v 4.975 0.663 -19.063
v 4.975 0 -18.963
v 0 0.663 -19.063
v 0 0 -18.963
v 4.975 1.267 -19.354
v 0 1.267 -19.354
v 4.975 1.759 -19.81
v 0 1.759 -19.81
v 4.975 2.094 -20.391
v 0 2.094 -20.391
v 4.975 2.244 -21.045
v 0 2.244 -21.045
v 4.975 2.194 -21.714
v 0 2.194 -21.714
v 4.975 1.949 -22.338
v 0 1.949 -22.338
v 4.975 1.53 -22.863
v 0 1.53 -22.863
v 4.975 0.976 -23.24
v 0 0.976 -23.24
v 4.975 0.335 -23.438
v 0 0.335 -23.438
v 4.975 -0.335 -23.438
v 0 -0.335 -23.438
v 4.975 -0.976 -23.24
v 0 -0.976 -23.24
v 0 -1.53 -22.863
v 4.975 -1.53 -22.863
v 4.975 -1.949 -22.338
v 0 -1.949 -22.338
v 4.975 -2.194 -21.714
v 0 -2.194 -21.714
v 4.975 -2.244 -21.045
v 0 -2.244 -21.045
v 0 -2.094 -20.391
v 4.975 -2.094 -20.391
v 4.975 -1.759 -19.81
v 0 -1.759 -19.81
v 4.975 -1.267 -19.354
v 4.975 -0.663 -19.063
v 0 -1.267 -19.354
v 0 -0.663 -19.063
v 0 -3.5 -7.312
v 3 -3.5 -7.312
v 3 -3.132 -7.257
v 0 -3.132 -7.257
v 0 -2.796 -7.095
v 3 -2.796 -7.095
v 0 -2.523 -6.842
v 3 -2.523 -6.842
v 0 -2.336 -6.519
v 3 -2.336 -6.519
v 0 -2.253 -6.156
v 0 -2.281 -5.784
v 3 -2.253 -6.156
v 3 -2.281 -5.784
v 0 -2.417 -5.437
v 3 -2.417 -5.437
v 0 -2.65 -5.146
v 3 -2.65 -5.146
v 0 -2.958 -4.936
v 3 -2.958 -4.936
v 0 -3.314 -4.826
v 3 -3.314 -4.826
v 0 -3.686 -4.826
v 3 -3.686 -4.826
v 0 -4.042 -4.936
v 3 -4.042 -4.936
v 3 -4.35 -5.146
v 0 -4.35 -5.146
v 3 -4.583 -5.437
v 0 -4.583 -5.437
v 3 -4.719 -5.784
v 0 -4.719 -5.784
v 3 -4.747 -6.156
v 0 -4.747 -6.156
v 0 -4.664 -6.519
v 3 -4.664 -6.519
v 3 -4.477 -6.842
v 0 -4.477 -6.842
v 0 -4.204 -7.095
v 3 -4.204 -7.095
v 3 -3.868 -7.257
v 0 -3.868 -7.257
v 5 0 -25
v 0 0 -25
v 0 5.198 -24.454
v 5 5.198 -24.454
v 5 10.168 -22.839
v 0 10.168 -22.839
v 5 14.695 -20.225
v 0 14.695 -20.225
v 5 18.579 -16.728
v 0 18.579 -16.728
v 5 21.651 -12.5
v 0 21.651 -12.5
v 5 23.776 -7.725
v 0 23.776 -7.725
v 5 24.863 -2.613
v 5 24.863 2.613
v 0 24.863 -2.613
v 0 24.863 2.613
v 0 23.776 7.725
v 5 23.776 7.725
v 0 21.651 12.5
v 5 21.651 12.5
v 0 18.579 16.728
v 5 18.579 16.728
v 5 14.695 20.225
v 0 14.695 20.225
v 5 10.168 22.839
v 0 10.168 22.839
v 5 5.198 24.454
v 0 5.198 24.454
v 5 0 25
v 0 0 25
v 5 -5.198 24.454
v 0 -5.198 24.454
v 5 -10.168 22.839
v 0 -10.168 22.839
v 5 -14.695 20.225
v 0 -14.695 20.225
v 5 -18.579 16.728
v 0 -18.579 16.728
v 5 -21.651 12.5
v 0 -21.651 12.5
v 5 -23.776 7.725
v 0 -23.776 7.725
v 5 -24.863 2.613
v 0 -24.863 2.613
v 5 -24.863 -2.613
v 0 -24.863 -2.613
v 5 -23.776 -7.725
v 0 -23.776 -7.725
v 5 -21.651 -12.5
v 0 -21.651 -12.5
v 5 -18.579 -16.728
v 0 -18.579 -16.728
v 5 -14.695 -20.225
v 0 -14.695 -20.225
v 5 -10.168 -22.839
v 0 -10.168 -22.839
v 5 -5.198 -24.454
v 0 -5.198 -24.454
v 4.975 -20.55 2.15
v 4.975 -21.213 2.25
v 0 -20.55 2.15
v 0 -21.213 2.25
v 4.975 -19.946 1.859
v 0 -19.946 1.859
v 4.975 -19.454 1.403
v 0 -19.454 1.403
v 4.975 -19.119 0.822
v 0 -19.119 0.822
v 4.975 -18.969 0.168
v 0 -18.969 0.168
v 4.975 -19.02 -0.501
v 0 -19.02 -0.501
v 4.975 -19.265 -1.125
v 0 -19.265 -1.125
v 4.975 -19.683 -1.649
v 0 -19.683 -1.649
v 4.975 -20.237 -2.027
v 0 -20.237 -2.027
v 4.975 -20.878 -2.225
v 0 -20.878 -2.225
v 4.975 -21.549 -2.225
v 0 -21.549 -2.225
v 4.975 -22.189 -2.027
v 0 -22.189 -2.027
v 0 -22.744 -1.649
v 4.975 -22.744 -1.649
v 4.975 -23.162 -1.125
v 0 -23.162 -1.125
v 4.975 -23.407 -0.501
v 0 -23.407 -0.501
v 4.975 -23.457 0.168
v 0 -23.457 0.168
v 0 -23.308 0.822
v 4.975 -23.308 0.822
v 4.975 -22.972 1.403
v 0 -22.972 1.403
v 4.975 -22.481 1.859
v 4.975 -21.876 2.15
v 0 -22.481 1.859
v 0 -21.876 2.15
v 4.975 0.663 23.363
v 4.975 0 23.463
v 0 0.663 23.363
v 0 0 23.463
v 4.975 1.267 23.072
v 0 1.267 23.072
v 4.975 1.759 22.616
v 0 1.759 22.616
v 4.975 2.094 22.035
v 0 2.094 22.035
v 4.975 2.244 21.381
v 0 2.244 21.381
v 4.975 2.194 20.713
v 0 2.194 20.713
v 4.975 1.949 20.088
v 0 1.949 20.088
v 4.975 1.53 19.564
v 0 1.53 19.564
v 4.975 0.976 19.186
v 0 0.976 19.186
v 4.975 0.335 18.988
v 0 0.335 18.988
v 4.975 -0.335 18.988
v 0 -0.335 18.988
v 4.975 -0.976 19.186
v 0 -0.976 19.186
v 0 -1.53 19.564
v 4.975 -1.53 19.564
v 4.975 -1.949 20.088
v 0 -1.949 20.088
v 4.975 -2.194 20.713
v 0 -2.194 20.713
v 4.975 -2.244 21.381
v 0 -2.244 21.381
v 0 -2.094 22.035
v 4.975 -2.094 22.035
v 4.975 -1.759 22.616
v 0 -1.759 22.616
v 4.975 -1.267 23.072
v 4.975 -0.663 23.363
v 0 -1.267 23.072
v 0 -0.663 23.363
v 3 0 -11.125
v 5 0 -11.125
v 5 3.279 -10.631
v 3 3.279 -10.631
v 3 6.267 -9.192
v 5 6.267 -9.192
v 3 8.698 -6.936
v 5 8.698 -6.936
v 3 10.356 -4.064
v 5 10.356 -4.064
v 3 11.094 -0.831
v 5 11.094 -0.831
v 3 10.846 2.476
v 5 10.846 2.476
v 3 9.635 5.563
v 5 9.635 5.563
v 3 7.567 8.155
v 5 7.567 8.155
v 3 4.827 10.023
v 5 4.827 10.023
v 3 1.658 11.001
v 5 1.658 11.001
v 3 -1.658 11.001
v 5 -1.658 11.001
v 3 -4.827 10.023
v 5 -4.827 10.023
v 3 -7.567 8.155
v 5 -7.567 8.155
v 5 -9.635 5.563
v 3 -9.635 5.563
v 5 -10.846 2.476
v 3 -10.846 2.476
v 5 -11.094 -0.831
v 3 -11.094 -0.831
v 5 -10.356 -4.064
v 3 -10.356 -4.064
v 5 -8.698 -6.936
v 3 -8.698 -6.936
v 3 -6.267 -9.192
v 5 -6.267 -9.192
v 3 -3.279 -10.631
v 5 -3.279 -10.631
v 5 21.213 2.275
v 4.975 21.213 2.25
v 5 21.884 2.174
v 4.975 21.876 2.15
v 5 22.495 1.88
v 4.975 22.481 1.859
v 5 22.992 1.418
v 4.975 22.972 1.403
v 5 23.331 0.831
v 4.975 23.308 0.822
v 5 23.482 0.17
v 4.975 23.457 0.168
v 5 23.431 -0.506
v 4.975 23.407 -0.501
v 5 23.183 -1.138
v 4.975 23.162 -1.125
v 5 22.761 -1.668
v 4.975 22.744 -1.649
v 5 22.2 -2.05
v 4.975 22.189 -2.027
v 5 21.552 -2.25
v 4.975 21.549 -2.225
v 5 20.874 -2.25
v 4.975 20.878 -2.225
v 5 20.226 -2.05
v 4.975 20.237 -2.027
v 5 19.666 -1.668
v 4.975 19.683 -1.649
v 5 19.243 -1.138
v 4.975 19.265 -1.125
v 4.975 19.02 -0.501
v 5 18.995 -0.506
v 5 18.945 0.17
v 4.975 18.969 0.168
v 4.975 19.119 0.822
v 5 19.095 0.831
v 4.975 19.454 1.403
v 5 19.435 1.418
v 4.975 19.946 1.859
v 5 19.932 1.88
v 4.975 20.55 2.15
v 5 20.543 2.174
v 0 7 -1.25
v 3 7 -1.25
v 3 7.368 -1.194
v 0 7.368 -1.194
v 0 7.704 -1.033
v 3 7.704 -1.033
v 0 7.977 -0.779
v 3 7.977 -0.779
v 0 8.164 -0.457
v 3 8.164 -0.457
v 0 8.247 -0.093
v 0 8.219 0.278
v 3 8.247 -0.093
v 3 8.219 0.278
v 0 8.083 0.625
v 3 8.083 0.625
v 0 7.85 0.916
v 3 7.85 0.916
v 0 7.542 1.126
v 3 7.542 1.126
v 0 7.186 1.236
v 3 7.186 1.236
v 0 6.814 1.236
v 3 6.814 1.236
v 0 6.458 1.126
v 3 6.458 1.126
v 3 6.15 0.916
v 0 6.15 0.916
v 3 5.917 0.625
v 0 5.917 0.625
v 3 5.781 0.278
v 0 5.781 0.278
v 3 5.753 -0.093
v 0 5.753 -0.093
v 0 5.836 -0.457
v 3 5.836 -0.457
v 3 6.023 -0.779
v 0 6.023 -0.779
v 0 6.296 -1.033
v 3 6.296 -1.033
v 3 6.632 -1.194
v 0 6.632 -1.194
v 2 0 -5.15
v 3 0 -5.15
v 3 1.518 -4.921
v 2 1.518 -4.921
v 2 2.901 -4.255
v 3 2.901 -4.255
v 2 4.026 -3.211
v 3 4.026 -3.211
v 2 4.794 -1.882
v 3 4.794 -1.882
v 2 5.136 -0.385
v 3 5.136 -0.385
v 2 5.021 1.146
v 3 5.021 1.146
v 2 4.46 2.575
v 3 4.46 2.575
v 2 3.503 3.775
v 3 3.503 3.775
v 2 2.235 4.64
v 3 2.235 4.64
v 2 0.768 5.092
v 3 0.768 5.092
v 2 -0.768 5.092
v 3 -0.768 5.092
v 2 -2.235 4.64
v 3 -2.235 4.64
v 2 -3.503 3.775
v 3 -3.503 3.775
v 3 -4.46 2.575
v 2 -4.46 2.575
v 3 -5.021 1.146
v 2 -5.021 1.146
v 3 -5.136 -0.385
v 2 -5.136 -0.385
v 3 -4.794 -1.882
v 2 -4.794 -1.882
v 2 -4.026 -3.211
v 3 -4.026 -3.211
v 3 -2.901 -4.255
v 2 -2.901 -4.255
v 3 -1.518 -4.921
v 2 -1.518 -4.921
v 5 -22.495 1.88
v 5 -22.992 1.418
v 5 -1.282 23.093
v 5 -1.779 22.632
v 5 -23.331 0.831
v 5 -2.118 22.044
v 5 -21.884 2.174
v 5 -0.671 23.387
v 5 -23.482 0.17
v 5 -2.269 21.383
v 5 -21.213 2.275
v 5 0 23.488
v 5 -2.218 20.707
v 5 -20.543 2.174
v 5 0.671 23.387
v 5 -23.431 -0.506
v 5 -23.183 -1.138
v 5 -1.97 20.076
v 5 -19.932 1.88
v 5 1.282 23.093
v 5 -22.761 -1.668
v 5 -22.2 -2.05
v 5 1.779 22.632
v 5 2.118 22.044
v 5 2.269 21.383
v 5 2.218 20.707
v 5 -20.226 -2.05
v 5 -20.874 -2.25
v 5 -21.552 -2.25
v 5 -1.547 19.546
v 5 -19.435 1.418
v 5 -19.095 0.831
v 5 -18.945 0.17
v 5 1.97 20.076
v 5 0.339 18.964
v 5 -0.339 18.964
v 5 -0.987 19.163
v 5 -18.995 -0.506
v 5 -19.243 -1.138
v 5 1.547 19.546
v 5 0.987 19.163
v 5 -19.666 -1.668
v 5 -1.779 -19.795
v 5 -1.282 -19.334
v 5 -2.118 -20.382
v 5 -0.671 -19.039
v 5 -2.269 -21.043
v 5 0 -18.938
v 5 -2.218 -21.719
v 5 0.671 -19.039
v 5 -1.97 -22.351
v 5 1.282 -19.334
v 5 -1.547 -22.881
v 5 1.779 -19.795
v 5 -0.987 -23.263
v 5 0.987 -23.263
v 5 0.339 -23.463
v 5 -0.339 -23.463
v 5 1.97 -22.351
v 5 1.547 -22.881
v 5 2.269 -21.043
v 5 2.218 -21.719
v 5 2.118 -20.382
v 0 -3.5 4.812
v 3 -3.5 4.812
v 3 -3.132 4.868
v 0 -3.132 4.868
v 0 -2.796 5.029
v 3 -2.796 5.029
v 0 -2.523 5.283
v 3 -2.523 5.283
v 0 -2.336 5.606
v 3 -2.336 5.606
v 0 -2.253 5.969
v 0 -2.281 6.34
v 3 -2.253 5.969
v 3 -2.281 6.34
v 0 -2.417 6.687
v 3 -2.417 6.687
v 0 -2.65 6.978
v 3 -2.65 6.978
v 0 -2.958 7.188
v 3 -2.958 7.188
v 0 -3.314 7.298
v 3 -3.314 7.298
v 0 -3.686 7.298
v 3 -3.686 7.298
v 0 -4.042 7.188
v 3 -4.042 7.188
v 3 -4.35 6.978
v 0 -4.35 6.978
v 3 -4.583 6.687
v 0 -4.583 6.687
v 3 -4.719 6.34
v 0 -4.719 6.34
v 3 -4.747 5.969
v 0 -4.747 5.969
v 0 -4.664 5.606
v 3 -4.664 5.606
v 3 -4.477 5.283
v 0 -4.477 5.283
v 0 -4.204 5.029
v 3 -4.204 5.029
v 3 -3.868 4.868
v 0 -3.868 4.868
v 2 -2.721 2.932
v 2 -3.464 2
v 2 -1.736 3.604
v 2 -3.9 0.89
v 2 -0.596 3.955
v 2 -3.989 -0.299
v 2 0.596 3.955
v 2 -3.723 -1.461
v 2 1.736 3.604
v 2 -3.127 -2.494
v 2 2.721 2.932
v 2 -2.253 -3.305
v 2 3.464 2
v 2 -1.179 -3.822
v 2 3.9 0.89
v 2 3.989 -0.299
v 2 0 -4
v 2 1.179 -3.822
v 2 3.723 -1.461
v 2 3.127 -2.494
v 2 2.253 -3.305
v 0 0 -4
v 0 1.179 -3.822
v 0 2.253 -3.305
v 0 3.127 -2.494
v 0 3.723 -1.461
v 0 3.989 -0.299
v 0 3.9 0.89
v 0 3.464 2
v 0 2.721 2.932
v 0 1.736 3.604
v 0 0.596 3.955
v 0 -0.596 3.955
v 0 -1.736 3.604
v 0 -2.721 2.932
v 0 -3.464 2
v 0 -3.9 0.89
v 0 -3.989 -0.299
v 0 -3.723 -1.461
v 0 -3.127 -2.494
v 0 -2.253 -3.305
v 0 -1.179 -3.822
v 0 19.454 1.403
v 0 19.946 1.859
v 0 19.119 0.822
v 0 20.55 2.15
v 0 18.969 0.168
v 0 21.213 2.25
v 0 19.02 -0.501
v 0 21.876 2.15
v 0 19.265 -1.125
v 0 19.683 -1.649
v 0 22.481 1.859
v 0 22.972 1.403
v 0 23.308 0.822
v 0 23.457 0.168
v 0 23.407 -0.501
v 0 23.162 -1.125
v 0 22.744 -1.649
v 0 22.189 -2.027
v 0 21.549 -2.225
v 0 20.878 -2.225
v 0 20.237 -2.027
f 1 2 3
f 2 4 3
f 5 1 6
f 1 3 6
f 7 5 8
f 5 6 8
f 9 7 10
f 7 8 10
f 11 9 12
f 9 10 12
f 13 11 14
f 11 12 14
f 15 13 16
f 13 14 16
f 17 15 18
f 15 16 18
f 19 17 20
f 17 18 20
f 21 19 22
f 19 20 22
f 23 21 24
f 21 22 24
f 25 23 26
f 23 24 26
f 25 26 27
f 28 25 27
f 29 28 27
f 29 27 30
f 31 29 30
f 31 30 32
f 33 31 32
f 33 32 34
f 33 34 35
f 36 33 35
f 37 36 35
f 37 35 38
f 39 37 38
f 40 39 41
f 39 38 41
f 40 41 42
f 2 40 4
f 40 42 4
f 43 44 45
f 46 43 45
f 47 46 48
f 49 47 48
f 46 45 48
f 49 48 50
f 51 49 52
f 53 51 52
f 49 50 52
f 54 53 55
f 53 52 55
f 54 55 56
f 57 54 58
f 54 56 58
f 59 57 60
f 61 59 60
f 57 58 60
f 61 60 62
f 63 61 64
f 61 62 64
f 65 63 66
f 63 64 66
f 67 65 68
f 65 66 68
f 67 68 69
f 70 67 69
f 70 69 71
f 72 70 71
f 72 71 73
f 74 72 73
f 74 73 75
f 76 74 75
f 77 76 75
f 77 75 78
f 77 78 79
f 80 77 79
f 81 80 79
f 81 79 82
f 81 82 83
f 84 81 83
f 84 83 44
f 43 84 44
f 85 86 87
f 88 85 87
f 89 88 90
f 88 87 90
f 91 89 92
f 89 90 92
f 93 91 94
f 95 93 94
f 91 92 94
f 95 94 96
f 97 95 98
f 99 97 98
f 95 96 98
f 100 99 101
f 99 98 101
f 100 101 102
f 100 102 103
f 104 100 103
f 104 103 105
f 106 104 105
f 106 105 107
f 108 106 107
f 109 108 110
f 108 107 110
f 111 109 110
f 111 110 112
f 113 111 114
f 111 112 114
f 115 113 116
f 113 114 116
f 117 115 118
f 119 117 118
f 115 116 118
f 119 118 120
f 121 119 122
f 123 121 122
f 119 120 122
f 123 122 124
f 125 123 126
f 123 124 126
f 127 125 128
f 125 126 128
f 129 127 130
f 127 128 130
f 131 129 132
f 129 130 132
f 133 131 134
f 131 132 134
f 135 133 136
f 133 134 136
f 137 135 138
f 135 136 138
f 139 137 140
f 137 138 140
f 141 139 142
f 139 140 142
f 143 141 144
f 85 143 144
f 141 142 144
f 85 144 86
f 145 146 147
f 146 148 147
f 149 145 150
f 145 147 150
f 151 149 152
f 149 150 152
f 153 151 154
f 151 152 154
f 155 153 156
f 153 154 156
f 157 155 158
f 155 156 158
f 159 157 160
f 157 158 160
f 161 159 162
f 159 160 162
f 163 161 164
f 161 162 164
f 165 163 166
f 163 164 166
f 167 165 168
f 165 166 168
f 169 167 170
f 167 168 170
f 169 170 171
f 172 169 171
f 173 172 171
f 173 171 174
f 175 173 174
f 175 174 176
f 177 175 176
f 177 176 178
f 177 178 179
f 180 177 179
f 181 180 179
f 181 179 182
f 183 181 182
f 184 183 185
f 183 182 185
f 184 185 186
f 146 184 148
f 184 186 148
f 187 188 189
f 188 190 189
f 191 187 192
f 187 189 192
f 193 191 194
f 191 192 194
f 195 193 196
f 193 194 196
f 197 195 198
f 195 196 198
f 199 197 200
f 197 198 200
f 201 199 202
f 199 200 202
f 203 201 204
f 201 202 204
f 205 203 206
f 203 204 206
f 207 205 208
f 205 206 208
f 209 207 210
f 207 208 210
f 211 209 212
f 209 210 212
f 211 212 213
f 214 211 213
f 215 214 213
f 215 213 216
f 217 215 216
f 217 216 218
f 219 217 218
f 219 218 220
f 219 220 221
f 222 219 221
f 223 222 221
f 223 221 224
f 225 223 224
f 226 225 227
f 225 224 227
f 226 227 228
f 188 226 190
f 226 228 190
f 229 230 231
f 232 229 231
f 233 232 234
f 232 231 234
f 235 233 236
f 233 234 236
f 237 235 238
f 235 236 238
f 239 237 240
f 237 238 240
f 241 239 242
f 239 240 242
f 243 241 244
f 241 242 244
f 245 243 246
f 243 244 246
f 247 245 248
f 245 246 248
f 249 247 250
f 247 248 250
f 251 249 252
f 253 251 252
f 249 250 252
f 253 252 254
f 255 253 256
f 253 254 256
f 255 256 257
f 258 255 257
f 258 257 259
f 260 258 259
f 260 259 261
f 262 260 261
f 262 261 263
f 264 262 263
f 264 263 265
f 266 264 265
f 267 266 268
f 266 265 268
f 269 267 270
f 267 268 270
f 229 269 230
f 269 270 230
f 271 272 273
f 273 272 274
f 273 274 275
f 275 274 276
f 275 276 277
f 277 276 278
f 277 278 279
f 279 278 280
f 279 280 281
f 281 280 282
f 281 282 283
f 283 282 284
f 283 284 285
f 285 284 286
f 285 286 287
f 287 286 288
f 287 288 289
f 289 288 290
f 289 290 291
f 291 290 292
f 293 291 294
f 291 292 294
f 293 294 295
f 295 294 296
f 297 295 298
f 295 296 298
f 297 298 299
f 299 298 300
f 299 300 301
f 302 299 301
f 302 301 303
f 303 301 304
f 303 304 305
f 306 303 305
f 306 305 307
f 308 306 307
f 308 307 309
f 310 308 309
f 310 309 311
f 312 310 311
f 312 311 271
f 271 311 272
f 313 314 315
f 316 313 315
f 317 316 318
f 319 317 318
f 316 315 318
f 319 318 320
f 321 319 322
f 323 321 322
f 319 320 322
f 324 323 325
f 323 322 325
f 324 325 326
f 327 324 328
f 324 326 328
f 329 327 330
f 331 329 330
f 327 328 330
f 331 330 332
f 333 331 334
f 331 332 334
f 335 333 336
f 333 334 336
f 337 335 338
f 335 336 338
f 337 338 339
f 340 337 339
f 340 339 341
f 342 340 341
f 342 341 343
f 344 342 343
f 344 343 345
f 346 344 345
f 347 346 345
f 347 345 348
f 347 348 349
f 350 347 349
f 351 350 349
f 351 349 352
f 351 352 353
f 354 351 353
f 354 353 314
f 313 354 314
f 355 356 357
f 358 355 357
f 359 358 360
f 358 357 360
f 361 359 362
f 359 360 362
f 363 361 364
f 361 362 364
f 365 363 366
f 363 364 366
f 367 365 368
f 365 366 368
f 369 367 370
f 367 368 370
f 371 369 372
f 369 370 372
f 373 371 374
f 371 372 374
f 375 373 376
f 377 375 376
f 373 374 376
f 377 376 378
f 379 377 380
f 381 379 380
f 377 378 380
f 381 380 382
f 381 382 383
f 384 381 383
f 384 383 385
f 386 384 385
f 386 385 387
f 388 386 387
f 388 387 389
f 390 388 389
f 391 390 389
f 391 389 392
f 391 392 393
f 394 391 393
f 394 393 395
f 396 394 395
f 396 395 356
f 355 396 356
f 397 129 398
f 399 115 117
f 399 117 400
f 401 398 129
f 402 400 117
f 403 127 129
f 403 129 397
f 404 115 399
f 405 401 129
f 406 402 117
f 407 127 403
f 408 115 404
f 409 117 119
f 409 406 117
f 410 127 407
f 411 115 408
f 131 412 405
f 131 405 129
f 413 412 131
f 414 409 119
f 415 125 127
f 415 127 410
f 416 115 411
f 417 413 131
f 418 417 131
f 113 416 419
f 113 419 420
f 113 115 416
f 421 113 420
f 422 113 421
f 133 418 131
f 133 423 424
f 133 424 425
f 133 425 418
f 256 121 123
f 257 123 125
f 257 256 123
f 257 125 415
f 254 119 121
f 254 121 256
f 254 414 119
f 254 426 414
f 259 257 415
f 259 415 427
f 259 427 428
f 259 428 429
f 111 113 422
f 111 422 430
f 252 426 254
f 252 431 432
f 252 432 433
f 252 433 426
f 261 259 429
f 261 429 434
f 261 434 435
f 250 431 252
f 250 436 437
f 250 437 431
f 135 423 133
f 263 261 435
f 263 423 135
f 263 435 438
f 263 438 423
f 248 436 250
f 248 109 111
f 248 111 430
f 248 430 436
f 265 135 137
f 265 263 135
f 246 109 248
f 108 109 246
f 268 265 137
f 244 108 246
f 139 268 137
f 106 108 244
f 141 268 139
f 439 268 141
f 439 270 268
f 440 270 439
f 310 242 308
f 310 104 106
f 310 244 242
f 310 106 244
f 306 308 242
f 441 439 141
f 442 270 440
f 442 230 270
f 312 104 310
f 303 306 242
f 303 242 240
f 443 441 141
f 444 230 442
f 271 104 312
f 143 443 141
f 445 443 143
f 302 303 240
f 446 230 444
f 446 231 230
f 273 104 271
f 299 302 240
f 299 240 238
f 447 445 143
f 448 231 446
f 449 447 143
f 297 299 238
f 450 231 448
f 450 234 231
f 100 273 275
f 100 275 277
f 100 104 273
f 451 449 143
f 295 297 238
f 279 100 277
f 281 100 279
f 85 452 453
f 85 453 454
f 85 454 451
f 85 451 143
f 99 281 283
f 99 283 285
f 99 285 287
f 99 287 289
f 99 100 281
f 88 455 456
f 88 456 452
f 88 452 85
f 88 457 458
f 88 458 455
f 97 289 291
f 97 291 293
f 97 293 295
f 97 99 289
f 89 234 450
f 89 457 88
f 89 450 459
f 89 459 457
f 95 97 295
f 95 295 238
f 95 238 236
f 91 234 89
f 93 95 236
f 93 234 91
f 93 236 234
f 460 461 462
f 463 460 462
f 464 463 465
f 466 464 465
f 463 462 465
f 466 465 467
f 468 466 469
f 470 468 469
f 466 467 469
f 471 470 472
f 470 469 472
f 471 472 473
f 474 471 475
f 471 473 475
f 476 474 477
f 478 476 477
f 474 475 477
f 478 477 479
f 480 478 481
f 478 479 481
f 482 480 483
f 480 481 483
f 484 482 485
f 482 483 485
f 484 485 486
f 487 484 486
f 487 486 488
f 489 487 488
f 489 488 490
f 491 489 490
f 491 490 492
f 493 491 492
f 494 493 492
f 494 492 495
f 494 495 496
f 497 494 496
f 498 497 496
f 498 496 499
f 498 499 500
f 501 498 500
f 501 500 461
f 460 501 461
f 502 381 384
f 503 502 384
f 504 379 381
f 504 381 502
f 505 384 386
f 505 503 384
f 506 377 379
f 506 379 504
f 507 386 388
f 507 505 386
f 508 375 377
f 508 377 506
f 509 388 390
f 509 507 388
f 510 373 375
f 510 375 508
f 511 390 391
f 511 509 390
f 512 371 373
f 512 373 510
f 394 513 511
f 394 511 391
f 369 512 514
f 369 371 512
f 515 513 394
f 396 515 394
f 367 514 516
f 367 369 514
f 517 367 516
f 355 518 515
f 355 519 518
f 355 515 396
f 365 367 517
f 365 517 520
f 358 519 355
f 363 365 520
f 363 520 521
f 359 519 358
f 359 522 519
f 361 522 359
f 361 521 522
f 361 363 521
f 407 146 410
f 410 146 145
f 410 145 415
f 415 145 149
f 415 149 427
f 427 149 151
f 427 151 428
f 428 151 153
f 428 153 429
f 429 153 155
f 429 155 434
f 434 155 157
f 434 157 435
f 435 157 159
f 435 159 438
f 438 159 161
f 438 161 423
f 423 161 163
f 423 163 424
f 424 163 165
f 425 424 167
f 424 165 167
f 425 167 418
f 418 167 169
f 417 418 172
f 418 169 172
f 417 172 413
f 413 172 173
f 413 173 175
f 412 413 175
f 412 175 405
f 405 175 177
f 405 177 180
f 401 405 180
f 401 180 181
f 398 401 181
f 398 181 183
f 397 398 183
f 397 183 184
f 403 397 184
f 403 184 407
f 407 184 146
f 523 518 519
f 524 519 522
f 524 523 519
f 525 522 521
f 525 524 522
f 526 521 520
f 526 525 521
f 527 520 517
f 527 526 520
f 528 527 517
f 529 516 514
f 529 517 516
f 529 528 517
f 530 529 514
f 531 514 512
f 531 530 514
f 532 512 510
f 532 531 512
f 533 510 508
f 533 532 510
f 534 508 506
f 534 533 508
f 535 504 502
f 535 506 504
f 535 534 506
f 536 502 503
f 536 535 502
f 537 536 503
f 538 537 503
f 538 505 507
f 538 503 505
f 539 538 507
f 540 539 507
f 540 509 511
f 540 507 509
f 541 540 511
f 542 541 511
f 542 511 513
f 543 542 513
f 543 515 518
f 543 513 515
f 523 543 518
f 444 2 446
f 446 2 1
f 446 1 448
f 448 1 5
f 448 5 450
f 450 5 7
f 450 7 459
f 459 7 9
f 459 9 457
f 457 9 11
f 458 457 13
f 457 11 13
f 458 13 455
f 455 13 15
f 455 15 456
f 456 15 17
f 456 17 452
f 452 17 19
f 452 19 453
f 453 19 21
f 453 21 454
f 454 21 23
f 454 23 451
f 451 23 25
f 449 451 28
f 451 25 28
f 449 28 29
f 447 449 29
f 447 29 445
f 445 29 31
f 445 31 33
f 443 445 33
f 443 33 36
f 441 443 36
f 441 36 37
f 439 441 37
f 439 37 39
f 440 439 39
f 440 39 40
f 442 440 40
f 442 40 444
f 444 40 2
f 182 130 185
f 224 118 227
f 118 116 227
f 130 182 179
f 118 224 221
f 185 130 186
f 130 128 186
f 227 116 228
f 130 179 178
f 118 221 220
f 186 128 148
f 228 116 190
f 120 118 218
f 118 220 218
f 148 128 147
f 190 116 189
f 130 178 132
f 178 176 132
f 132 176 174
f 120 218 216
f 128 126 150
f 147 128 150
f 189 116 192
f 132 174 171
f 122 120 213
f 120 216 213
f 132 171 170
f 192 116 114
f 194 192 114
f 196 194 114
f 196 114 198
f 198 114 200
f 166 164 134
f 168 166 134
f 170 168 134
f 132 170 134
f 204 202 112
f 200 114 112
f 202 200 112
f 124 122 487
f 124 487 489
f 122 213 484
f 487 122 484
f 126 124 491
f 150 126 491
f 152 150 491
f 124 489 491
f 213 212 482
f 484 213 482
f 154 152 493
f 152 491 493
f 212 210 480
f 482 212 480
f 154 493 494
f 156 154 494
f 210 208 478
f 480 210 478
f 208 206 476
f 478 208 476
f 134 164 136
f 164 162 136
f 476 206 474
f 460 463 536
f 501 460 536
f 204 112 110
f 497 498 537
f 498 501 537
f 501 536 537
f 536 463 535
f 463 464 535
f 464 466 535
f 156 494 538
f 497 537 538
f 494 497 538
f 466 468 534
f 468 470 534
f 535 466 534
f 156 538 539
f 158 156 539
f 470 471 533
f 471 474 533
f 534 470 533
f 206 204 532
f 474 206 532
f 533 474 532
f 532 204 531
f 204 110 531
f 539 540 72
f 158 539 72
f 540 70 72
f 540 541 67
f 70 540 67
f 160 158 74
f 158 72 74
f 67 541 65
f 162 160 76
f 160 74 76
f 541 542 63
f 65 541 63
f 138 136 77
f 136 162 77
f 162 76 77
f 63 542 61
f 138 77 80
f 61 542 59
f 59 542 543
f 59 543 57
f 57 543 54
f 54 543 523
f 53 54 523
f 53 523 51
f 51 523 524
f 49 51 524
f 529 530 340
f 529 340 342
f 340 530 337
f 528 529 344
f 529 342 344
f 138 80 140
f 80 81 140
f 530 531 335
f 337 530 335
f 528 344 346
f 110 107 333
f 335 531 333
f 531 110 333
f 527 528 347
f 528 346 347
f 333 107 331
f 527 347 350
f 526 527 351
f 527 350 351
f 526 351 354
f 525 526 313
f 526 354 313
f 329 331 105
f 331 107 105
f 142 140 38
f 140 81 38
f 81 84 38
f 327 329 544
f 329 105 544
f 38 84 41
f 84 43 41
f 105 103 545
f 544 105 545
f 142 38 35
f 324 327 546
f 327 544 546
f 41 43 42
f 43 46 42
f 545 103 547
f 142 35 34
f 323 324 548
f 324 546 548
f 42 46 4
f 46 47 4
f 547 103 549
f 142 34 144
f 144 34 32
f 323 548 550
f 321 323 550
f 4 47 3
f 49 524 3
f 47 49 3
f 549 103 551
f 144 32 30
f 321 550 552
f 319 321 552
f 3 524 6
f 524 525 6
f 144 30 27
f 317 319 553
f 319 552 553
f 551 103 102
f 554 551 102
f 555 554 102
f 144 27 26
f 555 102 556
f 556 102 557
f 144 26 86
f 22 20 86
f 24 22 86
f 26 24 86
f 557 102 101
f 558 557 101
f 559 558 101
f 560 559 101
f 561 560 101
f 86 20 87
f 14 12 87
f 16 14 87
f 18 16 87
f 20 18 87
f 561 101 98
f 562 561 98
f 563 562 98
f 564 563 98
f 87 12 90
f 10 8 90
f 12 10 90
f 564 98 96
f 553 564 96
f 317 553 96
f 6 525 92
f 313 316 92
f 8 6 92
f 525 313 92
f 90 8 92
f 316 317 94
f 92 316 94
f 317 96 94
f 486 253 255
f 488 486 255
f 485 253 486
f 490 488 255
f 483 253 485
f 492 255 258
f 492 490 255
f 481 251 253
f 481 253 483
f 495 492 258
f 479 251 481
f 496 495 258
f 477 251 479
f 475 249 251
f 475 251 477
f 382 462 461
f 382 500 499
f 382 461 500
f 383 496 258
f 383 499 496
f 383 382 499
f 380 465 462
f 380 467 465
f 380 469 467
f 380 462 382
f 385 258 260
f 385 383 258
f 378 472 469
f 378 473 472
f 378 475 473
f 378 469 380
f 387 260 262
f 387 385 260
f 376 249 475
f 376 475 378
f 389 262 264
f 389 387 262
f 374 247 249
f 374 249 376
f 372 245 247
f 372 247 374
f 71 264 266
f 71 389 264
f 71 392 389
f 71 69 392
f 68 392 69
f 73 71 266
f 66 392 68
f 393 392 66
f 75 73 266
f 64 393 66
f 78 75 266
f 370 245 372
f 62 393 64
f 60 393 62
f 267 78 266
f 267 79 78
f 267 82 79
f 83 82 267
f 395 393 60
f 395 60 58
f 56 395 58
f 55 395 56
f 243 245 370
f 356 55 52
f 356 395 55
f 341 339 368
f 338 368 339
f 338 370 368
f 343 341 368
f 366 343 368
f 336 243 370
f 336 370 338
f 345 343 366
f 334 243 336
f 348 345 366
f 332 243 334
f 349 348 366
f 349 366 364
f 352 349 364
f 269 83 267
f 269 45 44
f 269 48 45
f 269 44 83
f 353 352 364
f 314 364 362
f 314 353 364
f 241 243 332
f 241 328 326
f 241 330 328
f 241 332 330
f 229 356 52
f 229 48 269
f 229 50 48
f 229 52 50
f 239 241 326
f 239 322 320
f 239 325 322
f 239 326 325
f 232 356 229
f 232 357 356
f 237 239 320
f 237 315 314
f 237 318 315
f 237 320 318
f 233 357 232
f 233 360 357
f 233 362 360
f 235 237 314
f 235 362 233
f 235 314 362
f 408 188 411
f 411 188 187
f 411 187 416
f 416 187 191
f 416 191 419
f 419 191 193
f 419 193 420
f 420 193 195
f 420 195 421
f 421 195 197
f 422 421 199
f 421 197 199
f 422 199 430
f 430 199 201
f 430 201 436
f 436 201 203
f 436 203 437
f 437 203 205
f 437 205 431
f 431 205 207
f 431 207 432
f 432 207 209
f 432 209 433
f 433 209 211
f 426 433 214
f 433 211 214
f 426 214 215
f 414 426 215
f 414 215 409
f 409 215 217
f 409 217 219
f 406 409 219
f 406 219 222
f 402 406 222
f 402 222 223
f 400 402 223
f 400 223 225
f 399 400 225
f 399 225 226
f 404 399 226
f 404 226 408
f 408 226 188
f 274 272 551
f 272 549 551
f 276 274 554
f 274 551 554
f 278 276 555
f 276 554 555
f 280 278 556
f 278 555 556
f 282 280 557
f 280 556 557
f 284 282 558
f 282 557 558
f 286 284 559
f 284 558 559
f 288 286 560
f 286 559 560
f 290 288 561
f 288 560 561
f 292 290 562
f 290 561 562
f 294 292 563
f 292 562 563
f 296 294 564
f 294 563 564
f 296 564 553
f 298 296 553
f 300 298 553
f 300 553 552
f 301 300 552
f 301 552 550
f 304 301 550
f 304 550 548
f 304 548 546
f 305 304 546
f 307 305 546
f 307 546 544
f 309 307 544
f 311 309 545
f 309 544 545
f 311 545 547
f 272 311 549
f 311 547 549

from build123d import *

# Parameters (mm, degrees)
SKETCH1_R                      = 25
SKETCH1_R_2                    = 4
BOSS_EXTRUDE1_DEPTH            = 5
SKETCH2_R                      = 5.15
CUT_EXTRUDE1_DEPTH             = 3
SKETCH3_R                      = 11.125
CUT_EXTRUDE2_DEPTH             = 2
SKETCH4_R                      = 1.25
CUT_EXTRUDE3_DEPTH             = 4
M4_CLEARANCE_HOLE1_D           = 4.5
M4_CLEARANCE_HOLE1_DEPTH       = 7.6
M4_CLEARANCE_HOLE1_CSINK_D     = 4.55
M4_CLEARANCE_HOLE1_CSINK_ANGLE = 90
M4_CLEARANCE_HOLE1_TIP         = 1.351936393


with BuildPart() as part:
    # Sketch1 → Boss-Extrude1 (new body)
    with BuildSketch(Plane(origin=(0, 0, 0), x_dir=(0, 0, -1), z_dir=(1, 0, 0))):
        Circle(SKETCH1_R)
        Circle(SKETCH1_R_2, mode=Mode.SUBTRACT)
    extrude(amount=BOSS_EXTRUDE1_DEPTH)

    # Sketch2 → Cut-Extrude1 (cut)
    with BuildSketch(Plane(origin=(5, 0, 0), x_dir=(0, 0, -1), z_dir=(1, 0, 0))):
        Circle(SKETCH2_R)
    extrude(amount=-CUT_EXTRUDE1_DEPTH, mode=Mode.SUBTRACT)

    # Sketch3 → Cut-Extrude2 (cut)
    with BuildSketch(Plane(origin=(5, 0, 0), x_dir=(0, 0, -1), z_dir=(1, 0, 0))):
        Circle(SKETCH3_R)
    extrude(amount=-CUT_EXTRUDE2_DEPTH, mode=Mode.SUBTRACT)

    # Sketch4 → Cut-Extrude3 (cut, through all)
    with BuildSketch(Plane(origin=(3, 0, 0), x_dir=(0, 0, -1), z_dir=(1, 0, 0))):
        with Locations((0, 7)):
            Circle(SKETCH4_R)
        with Locations((6.062177826, -3.5)):
            Circle(SKETCH4_R)
        with Locations((-6.062177826, -3.5)):
            Circle(SKETCH4_R)
    extrude(amount=-CUT_EXTRUDE3_DEPTH, mode=Mode.SUBTRACT)

    # M4 Clearance Hole1
    with Locations(Plane(origin=(5, 0, 0), x_dir=(0, 0, -1), z_dir=(1, 0, 0))):
        with Locations((0, 21.213203436), (21.213203436, 0), (-21.213203436, 0), (0, -21.213203436)):
            CounterSinkHole(M4_CLEARANCE_HOLE1_D / 2, M4_CLEARANCE_HOLE1_CSINK_D / 2, depth=M4_CLEARANCE_HOLE1_DEPTH, counter_sink_angle=M4_CLEARANCE_HOLE1_CSINK_ANGLE)
            with Locations((0, 0, -(M4_CLEARANCE_HOLE1_DEPTH + M4_CLEARANCE_HOLE1_TIP / 2))):  # 118° drill point
                Cone(0, M4_CLEARANCE_HOLE1_D / 2, M4_CLEARANCE_HOLE1_TIP, mode=Mode.SUBTRACT)


solid = part.part
